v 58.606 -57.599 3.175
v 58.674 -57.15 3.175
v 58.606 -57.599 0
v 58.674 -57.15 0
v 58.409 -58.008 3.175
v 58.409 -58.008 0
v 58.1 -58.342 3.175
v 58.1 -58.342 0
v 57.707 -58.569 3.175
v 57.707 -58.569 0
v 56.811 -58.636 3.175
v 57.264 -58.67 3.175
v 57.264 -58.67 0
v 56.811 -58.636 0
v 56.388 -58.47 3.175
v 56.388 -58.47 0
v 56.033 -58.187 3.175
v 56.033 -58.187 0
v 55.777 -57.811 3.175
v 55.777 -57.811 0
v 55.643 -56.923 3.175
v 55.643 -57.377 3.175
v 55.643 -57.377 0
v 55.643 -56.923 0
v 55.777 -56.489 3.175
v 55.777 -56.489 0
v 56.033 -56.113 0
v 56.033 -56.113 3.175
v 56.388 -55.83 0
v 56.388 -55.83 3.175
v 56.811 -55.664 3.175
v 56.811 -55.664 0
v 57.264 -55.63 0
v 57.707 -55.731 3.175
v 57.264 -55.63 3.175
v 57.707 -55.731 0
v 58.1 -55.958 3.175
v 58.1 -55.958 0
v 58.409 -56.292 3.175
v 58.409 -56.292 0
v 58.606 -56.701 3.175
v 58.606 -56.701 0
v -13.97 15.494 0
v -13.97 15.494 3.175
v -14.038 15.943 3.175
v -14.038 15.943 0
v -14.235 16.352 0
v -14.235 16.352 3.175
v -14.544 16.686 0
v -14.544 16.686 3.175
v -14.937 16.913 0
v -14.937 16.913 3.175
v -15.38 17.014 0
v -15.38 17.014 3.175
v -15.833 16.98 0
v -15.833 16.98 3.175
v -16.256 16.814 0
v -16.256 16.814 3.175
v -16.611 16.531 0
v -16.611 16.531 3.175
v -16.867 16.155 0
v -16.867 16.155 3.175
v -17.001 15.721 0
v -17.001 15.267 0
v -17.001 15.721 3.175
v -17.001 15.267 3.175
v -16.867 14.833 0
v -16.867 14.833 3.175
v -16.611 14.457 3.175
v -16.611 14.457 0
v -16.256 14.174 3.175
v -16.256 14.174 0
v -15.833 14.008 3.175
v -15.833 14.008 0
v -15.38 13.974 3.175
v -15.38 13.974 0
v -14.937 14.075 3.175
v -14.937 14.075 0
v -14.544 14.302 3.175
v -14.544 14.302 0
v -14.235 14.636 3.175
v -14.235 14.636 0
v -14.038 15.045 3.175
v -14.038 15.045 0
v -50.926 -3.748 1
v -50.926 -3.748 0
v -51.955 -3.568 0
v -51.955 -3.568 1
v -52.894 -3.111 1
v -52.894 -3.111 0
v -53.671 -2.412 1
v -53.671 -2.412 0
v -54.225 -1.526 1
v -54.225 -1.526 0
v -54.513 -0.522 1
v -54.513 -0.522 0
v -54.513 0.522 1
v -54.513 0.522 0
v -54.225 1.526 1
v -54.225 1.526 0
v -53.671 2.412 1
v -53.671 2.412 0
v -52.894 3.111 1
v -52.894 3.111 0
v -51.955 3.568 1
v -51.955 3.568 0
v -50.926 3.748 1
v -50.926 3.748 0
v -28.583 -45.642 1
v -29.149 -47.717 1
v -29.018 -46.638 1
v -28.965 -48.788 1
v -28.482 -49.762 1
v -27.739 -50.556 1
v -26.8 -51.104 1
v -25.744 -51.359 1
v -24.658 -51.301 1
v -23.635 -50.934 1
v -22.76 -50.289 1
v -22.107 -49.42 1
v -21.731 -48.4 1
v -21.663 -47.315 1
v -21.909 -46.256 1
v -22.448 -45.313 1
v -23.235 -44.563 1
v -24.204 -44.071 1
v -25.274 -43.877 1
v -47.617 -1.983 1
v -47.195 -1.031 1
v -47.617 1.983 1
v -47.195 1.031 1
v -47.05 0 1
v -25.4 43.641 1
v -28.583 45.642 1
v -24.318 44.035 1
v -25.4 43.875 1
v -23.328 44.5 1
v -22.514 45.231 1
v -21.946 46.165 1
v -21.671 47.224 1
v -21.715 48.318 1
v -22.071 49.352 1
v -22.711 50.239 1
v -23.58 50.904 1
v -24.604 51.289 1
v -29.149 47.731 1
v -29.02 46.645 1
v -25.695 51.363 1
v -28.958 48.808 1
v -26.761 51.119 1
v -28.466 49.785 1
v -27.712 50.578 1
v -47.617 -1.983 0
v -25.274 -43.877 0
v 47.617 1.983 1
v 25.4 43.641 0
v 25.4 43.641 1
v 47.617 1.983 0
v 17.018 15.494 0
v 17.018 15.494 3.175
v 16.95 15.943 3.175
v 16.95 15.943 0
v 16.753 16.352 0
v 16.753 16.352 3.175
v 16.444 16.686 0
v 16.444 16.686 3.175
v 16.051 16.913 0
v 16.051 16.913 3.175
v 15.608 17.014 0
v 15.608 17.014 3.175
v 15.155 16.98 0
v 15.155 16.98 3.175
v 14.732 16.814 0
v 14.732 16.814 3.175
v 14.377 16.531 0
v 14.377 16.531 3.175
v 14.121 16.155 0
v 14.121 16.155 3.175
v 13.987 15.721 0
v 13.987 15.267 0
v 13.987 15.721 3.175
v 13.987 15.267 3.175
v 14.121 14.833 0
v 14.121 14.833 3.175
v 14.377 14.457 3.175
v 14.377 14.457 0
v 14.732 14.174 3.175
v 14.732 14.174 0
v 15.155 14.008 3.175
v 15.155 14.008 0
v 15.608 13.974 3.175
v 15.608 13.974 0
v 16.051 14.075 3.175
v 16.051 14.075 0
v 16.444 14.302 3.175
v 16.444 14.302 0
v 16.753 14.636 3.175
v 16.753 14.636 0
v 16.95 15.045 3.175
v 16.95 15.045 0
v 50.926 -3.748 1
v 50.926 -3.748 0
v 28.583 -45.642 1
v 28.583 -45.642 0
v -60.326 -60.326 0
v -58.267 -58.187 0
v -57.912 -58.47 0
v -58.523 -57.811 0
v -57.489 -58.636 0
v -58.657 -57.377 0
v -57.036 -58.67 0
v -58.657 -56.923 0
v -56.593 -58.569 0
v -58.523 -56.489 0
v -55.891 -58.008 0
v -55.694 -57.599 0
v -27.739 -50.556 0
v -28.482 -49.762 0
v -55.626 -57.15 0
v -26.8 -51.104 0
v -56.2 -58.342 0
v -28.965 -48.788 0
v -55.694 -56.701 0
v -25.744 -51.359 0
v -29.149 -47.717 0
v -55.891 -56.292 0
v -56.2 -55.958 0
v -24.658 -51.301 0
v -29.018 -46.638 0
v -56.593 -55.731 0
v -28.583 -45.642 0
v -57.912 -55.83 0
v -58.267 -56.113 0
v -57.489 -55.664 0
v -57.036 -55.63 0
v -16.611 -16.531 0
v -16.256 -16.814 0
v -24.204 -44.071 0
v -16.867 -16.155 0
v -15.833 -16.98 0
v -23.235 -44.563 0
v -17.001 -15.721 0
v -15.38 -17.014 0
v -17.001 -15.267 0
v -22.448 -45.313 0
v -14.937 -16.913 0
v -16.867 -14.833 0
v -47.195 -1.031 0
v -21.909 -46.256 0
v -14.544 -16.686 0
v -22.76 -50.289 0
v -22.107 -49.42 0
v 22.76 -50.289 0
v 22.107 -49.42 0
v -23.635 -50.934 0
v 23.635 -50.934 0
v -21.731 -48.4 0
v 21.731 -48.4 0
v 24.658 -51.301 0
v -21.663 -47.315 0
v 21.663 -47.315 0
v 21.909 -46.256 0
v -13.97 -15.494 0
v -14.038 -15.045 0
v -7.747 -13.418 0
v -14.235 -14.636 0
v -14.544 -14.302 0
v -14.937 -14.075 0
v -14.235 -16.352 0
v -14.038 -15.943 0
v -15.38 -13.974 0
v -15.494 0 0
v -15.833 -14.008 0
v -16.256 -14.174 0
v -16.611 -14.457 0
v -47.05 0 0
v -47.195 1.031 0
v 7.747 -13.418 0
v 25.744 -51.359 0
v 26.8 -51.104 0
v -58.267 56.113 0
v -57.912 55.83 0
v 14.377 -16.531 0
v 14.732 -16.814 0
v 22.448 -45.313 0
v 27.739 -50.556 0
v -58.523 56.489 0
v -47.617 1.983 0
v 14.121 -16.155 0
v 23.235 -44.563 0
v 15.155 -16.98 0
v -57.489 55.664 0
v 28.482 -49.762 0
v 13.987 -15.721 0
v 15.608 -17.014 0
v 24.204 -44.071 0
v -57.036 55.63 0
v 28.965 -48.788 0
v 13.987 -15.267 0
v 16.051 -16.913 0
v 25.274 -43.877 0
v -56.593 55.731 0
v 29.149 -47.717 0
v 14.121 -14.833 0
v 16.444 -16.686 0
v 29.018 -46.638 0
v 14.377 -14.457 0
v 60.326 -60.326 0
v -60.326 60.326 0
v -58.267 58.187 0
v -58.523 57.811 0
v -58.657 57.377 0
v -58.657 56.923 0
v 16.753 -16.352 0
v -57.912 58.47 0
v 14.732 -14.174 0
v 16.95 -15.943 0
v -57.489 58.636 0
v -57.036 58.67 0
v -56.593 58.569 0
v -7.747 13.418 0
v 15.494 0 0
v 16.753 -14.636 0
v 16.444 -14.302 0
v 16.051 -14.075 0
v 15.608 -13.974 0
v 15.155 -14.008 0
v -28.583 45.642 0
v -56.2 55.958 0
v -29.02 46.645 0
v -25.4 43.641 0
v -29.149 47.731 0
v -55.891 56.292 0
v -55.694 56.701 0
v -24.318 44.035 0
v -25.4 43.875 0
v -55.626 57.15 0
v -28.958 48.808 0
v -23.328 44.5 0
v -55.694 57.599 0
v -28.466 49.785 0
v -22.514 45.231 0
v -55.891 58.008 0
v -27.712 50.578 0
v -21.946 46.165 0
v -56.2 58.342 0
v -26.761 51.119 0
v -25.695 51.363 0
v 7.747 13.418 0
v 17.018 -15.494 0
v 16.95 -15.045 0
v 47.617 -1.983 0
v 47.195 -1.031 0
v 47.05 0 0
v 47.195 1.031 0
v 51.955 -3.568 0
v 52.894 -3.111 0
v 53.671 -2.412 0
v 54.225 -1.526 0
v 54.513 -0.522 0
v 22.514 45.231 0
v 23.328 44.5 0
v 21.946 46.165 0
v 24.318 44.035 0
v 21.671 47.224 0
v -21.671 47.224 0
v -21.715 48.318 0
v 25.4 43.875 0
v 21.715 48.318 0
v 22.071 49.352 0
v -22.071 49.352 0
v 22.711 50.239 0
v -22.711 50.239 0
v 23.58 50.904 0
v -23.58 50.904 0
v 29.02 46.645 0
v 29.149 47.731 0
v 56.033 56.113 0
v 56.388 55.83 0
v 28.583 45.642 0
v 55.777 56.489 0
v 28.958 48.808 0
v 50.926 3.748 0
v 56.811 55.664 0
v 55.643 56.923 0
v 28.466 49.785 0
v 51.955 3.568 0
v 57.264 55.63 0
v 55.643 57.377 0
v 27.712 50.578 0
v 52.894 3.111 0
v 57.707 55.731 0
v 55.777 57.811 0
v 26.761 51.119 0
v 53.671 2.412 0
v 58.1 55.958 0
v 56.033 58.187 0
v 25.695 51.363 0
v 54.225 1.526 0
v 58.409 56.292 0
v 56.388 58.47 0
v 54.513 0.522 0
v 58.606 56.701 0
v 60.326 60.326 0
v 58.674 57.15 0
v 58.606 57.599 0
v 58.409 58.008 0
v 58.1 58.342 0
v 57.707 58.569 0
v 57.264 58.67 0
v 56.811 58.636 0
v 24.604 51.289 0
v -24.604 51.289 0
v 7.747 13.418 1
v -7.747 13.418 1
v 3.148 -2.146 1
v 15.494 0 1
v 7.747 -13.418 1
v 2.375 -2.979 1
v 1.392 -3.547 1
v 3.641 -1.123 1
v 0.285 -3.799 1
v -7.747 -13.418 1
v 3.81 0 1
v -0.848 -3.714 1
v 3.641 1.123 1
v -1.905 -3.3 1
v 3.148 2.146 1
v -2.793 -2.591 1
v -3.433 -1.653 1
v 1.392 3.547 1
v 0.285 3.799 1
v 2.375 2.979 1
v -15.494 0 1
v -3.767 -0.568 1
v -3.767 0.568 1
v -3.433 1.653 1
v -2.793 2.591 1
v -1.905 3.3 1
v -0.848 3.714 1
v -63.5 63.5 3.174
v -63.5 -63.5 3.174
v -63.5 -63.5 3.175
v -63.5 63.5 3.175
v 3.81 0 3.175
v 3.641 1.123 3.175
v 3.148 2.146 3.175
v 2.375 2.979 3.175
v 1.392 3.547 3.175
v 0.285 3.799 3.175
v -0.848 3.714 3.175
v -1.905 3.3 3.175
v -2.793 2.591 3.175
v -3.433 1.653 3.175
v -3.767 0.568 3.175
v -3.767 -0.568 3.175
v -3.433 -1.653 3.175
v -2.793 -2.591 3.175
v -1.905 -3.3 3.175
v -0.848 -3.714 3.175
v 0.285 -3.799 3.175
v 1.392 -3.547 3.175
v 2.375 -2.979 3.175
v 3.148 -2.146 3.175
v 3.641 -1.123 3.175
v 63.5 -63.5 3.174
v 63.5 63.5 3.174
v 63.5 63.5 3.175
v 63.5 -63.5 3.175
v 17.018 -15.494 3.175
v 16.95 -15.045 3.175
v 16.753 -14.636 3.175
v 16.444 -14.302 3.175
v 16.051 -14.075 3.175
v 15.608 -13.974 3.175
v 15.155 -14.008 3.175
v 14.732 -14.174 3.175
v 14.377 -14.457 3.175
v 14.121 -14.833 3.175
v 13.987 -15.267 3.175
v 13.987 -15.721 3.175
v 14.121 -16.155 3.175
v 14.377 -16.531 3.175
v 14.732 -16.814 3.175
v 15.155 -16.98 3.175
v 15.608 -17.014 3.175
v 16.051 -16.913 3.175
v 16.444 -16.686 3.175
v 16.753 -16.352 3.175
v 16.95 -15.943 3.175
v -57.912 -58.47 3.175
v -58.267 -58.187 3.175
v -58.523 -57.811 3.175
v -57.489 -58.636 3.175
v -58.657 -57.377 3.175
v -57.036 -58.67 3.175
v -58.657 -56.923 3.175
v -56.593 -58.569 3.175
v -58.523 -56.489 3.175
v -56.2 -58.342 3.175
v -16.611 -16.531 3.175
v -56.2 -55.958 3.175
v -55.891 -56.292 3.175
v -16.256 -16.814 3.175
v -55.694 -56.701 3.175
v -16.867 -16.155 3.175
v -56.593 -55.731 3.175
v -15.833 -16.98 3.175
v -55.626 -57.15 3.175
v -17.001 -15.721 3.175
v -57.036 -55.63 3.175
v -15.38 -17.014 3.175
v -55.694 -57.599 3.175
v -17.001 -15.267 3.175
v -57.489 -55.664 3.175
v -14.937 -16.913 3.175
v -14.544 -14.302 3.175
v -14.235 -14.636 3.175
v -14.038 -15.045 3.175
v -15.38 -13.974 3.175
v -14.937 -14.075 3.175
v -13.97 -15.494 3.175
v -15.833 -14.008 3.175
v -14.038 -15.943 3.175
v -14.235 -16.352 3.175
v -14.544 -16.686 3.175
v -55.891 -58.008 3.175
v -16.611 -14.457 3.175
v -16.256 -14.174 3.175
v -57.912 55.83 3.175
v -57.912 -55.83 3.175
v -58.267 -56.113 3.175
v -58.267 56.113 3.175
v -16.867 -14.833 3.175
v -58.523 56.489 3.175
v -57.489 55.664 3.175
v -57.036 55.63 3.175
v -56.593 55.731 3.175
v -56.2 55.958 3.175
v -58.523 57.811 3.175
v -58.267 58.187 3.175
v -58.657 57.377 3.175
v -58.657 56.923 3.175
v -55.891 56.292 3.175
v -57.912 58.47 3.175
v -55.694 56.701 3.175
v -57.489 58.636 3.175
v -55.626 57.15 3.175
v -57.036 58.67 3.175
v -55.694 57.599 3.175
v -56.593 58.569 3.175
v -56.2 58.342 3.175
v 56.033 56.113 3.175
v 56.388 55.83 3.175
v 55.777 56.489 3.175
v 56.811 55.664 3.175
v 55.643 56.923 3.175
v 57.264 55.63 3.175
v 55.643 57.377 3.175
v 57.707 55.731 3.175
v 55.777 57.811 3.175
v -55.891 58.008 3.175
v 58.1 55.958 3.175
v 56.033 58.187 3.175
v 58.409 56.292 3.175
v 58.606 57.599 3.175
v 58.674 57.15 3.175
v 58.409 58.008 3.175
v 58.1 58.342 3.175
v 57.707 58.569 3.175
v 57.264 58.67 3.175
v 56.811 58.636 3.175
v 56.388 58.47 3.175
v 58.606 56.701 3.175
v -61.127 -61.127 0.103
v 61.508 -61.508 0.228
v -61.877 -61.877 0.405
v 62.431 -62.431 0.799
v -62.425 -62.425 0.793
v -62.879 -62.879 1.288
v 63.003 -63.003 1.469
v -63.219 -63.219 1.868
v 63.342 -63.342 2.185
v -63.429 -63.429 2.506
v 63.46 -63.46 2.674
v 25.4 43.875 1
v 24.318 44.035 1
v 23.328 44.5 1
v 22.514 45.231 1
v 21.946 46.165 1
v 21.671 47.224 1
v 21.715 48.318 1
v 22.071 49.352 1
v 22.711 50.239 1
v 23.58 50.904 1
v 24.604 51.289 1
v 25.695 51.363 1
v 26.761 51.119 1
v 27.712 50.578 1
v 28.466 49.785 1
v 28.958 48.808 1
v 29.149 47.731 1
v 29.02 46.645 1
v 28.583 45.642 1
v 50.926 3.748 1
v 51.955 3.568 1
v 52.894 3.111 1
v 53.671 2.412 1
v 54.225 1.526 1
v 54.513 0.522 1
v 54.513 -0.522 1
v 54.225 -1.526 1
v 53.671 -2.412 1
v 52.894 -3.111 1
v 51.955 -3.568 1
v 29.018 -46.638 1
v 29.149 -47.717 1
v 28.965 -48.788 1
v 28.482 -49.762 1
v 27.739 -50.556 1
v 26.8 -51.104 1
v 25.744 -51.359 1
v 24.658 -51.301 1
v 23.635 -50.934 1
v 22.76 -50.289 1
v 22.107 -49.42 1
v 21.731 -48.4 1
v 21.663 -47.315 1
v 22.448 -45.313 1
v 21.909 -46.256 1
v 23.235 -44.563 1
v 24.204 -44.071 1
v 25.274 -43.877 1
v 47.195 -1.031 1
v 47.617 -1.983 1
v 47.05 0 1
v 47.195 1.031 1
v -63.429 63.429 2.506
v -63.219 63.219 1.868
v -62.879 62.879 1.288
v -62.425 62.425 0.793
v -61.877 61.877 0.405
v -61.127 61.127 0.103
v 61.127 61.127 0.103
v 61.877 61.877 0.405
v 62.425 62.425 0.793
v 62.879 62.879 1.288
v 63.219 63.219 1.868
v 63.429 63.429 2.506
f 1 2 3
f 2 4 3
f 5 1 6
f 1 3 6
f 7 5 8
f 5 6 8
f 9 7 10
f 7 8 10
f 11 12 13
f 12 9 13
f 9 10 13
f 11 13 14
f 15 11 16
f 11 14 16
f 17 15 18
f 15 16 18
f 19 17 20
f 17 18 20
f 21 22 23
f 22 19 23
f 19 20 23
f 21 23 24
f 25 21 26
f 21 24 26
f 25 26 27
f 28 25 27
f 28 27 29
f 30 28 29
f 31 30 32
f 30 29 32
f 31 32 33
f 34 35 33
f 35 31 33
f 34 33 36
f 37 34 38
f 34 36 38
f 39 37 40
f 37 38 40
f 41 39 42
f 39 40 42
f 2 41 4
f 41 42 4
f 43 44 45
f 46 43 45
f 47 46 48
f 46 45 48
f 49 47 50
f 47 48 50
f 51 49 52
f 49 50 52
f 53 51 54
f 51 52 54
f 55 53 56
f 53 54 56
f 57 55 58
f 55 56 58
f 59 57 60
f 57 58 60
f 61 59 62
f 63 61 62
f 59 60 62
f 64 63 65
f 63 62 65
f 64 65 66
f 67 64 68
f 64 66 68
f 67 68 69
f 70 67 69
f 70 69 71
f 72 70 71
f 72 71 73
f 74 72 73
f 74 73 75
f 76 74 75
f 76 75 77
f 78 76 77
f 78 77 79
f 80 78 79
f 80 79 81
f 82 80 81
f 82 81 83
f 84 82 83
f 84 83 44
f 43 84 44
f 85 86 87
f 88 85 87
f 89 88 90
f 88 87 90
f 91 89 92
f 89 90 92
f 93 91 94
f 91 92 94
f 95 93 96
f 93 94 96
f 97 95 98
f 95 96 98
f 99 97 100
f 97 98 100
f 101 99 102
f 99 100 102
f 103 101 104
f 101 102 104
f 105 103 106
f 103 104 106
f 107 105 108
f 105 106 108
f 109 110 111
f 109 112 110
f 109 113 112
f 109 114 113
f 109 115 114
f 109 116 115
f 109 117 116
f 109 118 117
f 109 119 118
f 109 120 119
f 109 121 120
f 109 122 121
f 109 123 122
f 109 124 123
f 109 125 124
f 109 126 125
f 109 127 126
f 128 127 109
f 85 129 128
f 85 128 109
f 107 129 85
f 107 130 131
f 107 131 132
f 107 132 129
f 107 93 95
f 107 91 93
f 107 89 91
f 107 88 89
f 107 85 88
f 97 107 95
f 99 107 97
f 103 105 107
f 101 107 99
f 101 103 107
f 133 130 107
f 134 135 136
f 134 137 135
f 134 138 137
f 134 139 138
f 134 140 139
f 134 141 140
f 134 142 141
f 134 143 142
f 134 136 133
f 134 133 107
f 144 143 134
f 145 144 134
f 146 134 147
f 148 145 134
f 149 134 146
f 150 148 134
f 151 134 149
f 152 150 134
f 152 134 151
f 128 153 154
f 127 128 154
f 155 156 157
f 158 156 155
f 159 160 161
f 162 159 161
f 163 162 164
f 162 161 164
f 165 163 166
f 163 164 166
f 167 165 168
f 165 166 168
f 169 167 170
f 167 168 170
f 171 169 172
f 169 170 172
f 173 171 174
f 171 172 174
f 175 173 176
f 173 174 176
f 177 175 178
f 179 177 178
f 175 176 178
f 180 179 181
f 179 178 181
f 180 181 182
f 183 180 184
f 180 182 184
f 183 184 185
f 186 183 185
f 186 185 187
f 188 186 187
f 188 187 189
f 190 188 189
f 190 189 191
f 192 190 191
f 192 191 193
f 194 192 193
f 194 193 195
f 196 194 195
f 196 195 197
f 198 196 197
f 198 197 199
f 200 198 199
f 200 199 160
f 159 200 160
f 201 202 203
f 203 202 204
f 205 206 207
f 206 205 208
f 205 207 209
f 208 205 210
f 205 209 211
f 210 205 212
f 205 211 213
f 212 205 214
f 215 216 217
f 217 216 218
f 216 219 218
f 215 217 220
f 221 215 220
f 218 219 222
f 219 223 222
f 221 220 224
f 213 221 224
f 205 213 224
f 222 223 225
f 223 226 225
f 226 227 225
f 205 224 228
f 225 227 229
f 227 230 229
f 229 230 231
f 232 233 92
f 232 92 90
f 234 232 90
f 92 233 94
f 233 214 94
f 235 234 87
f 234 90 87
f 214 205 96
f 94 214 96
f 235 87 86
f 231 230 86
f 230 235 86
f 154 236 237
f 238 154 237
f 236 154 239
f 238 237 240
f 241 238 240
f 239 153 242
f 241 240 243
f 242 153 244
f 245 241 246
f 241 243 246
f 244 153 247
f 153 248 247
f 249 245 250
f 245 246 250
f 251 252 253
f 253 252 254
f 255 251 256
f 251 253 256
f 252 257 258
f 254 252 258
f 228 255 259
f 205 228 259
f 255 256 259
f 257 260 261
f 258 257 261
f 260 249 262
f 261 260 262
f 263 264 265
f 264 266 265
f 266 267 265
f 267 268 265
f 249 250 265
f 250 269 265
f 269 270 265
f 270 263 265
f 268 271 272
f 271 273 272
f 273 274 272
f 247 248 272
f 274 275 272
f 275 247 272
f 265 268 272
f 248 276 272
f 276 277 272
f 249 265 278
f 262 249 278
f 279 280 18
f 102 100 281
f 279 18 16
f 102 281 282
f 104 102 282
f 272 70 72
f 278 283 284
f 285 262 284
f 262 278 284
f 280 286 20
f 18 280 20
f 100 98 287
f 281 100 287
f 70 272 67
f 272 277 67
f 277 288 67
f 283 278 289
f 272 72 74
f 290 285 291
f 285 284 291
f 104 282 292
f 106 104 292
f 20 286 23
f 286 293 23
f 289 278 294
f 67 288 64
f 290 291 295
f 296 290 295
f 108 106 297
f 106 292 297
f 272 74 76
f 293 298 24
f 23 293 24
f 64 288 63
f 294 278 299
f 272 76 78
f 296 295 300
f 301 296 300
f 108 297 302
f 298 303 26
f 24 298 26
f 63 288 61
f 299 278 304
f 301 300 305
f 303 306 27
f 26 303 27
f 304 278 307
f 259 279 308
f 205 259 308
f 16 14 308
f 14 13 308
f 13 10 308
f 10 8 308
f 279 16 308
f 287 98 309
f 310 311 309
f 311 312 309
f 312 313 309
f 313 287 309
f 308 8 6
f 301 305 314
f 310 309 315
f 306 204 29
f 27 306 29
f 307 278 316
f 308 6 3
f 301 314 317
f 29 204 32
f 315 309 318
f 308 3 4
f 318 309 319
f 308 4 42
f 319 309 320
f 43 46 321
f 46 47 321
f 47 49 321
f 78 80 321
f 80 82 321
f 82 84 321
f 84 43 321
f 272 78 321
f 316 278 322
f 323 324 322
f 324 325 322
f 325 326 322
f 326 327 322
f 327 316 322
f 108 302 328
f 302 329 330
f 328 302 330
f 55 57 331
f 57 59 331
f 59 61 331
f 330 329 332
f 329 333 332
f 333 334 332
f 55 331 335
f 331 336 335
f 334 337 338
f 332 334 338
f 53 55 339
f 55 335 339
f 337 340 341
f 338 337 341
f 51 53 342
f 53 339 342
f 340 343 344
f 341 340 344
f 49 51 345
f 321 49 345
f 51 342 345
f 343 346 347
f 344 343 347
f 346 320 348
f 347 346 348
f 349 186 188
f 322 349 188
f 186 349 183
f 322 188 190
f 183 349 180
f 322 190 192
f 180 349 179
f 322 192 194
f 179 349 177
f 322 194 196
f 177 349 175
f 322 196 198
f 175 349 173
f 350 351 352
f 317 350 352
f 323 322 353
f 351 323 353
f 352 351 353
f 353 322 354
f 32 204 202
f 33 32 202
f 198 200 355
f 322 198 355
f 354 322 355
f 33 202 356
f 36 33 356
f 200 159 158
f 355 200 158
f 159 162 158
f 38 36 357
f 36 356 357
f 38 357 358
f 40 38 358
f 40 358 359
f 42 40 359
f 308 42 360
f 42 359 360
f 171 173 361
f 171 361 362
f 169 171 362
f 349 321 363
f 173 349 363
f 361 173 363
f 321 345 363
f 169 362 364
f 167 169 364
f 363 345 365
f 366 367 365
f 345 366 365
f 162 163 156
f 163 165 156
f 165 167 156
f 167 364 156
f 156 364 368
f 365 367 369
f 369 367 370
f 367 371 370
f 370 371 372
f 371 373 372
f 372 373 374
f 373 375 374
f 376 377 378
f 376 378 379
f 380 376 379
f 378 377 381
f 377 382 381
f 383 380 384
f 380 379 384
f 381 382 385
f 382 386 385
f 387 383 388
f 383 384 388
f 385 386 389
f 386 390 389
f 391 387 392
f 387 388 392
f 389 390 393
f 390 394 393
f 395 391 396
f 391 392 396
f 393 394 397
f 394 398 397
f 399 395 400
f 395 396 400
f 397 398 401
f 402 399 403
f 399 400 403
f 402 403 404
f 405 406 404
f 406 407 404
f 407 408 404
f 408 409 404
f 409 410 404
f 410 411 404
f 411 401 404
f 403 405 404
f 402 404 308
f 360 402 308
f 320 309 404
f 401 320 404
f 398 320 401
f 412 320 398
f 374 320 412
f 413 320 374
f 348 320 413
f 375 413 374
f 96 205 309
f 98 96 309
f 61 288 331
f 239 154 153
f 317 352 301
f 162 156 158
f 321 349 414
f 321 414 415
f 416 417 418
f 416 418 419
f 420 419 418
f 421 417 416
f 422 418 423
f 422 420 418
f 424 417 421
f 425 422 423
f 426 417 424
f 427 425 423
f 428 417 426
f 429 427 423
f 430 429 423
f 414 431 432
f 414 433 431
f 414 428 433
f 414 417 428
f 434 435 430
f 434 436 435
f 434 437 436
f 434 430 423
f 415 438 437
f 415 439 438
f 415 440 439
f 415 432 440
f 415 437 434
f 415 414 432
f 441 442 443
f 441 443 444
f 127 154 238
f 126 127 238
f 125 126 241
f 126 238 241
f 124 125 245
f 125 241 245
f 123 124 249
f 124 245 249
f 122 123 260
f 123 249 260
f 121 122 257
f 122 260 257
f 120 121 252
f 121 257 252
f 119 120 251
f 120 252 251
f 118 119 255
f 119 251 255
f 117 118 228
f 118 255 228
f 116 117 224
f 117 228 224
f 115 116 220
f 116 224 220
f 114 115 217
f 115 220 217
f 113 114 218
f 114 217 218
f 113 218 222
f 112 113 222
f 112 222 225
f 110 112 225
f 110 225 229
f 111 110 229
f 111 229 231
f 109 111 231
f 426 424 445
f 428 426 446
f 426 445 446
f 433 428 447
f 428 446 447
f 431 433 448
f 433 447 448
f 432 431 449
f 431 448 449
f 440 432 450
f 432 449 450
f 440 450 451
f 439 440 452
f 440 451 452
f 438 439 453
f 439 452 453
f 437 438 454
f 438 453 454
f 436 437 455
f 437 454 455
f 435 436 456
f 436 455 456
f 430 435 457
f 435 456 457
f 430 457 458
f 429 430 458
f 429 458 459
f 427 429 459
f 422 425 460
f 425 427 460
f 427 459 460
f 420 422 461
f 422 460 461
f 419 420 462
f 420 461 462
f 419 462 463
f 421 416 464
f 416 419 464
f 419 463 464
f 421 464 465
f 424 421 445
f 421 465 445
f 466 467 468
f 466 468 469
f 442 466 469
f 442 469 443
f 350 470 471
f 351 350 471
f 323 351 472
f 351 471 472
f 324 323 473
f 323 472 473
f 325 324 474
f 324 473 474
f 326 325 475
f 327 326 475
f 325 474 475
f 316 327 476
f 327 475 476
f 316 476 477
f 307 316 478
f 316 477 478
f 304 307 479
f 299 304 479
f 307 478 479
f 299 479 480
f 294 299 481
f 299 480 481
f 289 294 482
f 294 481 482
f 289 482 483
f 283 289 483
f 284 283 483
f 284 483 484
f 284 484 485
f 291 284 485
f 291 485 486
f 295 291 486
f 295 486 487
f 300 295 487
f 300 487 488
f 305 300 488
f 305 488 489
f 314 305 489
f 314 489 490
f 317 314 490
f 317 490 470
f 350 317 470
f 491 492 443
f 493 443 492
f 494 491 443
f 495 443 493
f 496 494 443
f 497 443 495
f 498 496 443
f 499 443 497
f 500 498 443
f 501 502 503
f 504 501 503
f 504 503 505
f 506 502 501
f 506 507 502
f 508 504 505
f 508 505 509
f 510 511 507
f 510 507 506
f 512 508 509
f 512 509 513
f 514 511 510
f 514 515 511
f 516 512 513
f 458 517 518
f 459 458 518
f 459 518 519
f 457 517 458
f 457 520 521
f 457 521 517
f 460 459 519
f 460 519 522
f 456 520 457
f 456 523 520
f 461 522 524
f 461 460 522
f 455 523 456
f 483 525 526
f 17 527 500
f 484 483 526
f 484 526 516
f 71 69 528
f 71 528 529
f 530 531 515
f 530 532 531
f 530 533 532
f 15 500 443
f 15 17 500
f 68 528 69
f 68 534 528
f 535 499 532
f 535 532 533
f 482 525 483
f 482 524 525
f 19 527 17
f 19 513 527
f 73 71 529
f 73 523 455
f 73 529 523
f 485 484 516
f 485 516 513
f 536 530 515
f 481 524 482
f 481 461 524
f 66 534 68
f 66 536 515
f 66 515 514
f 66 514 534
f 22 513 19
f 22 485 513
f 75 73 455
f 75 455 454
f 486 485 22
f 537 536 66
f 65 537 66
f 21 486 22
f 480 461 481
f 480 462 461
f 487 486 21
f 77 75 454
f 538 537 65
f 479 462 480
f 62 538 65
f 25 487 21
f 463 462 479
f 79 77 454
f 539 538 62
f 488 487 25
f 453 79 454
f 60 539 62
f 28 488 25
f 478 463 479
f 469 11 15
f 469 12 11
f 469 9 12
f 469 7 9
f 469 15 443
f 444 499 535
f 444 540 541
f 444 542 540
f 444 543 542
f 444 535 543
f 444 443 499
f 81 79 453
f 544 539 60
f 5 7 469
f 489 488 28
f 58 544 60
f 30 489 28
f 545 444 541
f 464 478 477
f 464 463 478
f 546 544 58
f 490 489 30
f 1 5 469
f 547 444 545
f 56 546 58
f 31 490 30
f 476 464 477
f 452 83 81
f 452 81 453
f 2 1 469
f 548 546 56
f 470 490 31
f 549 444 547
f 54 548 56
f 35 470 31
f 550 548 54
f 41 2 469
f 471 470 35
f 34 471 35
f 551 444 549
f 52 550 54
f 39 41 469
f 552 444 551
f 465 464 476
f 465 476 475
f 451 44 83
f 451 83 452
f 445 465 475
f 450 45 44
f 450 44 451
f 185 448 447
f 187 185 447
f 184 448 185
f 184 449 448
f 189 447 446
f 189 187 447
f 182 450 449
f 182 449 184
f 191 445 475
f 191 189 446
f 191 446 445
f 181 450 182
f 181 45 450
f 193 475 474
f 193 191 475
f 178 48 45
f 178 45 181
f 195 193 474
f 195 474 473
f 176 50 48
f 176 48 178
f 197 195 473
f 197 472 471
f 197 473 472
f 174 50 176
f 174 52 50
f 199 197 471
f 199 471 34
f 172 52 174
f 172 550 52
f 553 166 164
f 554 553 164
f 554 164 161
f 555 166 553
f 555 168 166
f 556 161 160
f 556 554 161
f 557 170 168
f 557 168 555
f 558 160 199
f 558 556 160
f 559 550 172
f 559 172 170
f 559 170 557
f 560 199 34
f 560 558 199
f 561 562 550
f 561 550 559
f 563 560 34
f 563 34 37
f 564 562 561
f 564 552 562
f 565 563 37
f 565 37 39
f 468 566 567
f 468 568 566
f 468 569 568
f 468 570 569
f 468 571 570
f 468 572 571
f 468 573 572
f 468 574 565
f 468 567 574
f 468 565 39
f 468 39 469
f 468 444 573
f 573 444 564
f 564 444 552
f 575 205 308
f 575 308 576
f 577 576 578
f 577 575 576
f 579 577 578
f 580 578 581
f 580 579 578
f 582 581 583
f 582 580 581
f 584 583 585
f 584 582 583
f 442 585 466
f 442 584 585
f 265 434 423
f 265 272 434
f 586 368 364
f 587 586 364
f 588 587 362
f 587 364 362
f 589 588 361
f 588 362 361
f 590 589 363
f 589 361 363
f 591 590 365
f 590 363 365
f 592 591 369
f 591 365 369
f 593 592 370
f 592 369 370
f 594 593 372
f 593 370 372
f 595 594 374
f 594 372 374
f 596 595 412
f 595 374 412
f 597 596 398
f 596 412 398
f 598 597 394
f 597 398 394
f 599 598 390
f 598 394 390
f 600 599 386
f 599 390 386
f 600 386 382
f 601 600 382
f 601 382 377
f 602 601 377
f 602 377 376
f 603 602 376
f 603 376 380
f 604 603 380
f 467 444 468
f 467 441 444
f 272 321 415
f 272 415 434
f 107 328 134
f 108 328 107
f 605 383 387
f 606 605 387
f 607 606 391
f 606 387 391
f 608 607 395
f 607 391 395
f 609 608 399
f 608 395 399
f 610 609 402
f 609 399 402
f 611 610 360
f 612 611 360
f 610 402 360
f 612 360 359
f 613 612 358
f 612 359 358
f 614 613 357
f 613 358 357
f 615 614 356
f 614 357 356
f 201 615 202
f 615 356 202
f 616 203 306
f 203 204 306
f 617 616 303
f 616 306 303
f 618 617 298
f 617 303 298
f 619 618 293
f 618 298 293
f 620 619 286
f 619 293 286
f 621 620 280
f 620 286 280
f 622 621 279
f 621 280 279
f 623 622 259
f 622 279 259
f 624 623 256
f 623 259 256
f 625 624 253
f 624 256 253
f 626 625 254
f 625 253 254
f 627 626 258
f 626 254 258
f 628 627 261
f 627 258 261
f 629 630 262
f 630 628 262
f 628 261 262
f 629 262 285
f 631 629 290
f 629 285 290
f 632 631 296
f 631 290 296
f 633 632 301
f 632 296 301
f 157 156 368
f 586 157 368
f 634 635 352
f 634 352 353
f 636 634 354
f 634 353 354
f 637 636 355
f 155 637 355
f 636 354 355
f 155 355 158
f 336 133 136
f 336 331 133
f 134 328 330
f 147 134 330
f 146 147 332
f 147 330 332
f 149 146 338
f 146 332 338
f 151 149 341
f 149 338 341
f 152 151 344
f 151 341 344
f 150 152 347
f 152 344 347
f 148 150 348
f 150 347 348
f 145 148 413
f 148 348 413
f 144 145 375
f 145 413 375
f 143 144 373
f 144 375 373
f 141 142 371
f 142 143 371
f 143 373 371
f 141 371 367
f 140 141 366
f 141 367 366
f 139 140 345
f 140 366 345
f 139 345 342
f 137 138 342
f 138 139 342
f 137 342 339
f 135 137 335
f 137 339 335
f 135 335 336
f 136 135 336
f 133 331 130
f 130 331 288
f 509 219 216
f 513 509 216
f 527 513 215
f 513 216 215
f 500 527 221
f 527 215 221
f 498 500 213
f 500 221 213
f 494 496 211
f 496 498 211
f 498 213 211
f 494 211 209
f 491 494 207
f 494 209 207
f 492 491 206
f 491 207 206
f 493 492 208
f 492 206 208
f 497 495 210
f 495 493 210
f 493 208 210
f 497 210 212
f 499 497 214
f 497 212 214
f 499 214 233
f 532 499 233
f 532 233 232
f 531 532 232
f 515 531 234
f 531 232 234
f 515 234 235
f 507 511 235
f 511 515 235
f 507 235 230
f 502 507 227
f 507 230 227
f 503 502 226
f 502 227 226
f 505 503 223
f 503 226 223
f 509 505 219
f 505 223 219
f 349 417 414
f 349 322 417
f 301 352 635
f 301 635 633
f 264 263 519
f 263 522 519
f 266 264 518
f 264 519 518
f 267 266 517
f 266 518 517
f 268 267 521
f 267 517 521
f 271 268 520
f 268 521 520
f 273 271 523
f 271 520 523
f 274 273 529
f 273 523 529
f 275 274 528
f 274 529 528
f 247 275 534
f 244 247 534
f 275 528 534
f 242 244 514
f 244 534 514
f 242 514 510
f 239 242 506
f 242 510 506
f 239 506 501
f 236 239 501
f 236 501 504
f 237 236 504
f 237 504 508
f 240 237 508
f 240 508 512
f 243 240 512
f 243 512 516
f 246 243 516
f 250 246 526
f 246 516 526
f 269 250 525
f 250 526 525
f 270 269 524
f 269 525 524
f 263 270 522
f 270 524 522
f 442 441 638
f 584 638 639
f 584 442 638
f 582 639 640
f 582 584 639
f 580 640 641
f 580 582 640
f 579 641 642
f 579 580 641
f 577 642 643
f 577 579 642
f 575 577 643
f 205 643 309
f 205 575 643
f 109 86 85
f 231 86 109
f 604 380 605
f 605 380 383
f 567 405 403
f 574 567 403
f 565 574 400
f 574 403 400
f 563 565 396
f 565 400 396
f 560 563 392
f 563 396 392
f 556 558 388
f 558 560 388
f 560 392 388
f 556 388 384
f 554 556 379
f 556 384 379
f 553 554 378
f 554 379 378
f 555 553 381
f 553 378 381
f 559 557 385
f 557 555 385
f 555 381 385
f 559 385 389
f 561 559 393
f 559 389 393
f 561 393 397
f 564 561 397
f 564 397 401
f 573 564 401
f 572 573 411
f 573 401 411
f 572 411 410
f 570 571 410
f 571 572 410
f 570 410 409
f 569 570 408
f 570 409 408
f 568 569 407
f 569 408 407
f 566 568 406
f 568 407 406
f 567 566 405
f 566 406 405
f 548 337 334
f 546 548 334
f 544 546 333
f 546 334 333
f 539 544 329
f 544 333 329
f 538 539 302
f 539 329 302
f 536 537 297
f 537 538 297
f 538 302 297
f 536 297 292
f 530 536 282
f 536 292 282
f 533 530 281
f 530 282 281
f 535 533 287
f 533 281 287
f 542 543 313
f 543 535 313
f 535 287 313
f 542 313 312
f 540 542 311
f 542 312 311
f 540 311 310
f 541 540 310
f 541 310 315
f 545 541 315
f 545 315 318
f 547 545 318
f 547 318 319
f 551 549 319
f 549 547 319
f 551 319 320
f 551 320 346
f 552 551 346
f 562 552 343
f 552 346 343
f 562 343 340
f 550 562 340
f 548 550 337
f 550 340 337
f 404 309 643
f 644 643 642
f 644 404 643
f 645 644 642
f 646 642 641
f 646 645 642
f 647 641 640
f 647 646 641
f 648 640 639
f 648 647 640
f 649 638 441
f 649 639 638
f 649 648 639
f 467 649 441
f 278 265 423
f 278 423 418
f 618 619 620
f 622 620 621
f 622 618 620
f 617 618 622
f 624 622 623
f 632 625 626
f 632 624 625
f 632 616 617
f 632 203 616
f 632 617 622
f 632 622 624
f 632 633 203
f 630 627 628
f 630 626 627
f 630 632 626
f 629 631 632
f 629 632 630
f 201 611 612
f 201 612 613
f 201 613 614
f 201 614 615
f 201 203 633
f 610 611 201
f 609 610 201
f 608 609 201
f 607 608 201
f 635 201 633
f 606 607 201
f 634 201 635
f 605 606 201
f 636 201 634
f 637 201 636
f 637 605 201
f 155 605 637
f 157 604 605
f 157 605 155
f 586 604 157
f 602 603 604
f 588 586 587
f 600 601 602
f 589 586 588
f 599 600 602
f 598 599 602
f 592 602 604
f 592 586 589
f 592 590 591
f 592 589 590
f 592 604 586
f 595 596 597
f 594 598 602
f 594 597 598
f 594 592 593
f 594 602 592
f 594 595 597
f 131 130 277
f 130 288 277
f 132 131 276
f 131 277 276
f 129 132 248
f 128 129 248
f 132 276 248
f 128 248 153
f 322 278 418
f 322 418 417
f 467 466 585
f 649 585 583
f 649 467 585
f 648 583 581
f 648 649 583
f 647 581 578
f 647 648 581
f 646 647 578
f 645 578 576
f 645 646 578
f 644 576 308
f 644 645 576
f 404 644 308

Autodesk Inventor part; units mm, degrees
ref_plane "YZ Plane" through (0, 0, 0) normal (1, 0, 0) x (0, 1, 0)
ref_plane "XZ Plane" through (0, 0, 0) normal (0, 1, 0) x (-1, 0, 0)
ref_plane "XY Plane" through (0, 0, 0) normal (0, 0, 1) x (1, 0, 0)
sketch "Sketch1" plane through (0, 0, 0) normal (0, 0, 1) x (1, 0, 0)
  line L0 (-63.5, 63.5) -> (63.5, 63.5)
  line L1 (63.5, 63.5) -> (63.5, -63.5)
  line L2 (63.5, -63.5) -> (-63.5, -63.5)
  line L3 (-63.5, -63.5) -> (-63.5, 63.5)
  circle A0 centre (-57.15, 57.15) radius 1.524
  circle A1 centre (57.15, 57.15) radius 1.524
  line L4 (63.5, 0) -> (-63.5, 0)
  circle A2 centre (-57.15, -57.15) radius 1.524
  circle A3 centre (57.15, -57.15) radius 1.524
  point P0 (0, 0)
  point P1 (0, 63.5)
  dimension "d0" = 127
  dimension "d1" = 127
  dimension "d2" = 127
  dimension "d3" = 3.048
  dimension "d4" = 3.048
  dimension "d5" = 6.35
  dimension "d6" = 6.35
  dimension "d7" = 6.35
  dimension "d8" = 6.35
extrude "Extrusion1" add sketch "Sketch1" along normal blind 3.175
sketch "Sketch2" plane through (0, 0, 3.175) normal (0, 0, 1) x (1, 0, 0)
  circle A0 centre (0, 0) radius 3.81
  circle A1 centre (-15.494, 15.494) radius 1.524
  circle A2 centre (15.494, 15.494) radius 1.524
  circle A3 centre (-15.494, -15.494) radius 1.524
  circle A4 centre (15.494, -15.494) radius 1.524
  line L0 (-15.494, 15.494) -> (15.494, 15.494)
  line L1 (-15.494, -15.494) -> (-15.494, 15.494)
  point P0 (0, 15.494)
  point P1 (-15.494, 0)
  dimension "d11" = 7.62
  dimension "d12" = 3.048
  dimension "d13" = 3.048
  dimension "d14" = 3.048
  dimension "d15" = 3.048
  dimension "d16" = 30.988
  dimension "d21" = 30.988
  dimension "d22" = 30.988
extrude "Extrusion2" cut sketch "Sketch2" against normal blind 25.4
fillet "Fillet1" radius 3.175 4 edges at (0, 63.5, 0) (-63.5, 0, 0) (0, -63.5, 0) (63.5, 0, 0)
sketch "Sketch4" plane through (0, 0, 0) normal (0, 0, -1) x (-1, 0, 0)
  circle A0 centre (0, 0) radius 3.81 projected
  line L0 (0, 0) -> (50.8, 0)
  line L1 (60.325, 60.325) -> (60.325, -60.325) projected
  line L2 (-60.325, 60.325) -> (60.325, 60.325) projected
  line L3 (0, 60.325) -> (60.325, 60.325)
  line L4 (63.5, 63.5) -> (63.5, -63.5) projected
  line L5 (60.325, 60.325) -> (60.325, 47.625)
  line L6 (25.4, 0) -> (25.4, 47.625)
  circle A1 centre (25.4, 47.625) radius 3.75
  circle A2 centre (50.8, 0) radius 3.75
  circle A3 centre (25.4, -47.625) radius 3.75
  line L7 (25.4, 47.625) -> (50.8, 0)
  line L8 (50.8, 0) -> (25.4, -47.625)
  line L9 (27.0544, 48.5074) -> (52.925, 0)
  line L10 (52.925, 0) -> (27.0544, -48.5074)
  line L11 (23.7456, 46.7426) -> (48.675, 0)
  line L12 (48.675, 0) -> (23.7456, -46.7426)
  circle A4 centre (15.494, 15.494) radius 1.524 projected
  line L13 (15.494, 0) -> (7.747, -13.4182)
  line L14 (7.747, -13.4182) -> (-7.747, -13.4182)
  line L15 (-7.747, -13.4182) -> (-15.494, 0)
  line L16 (-15.494, 0) -> (-7.747, 13.4182)
  line L17 (-7.747, 13.4182) -> (7.747, 13.4182)
  line L18 (7.747, 13.4182) -> (15.494, 0)
  line L19 (0, 60.325) -> (0, 13.4182)
  line L20 (0, 0) -> (-50.8, 0)
  line L21 (-25.4, 0) -> (-25.4, 47.625)
  circle A5 centre (-25.4, 47.625) radius 3.75
  circle A6 centre (-50.8, 0) radius 3.75
  circle A7 centre (-25.4, -47.625) radius 3.75
  line L22 (-25.4, 47.625) -> (-50.8, 0)
  line L23 (-50.8, 0) -> (-25.4, -47.625)
  line L24 (-27.0544, 48.5074) -> (-52.925, 0)
  line L25 (-52.925, 0) -> (-27.0544, -48.5074)
  line L26 (-23.7456, 46.7426) -> (-48.675, 0)
  line L27 (-48.675, 0) -> (-23.7456, -46.7426)
  circle A8 centre (-15.494, 15.494) radius 1.524
  point P0 (-25.4, 43.875)
  point P1 (-28.5827, 45.6418)
  point P2 (-50.9261, 3.7479)
  point P3 (-50.9261, -3.7479)
  point P4 (-28.5827, -45.6418)
  point P5 (-25.2739, -43.8771)
  point P6 (-47.6173, -1.9832)
  point P7 (-47.6173, 1.9832)
  point P8 (-25.4, 43.6406)
  point P9 (50.9261, 3.7479)
  point P10 (28.5827, 45.6418)
  point P11 (25.4, 43.875)
  point P12 (25.4, 43.6406)
  point P13 (47.6173, 1.9832)
  point P14 (47.6173, -1.9832)
  point P15 (25.2739, -43.8771)
  point P16 (28.5827, -45.6418)
  point P17 (50.9261, -3.7479)
  dimension "d24" = 50.8
  dimension "d25" = 12.7
  dimension "d26" = 7.5
  dimension "d27" = 7.5
  dimension "d28" = 1.875
  dimension "d29" = 1.875
extrude "Extrusion3" cut sketch "Sketch4" against normal blind 1 contours L0 L13 L14 L15 L20 A0 | A0 L20 L16 L17 L18 L0 | A2 L11 L0 | L0 L12 A2 | L6 A1 L7 A2 L11 | A6 L27 L20 | L20 L26 A6 | L26 A6 L22 A5 L21 | L11 A2 L7 L0 | L0 L8 A2 L12 | A2 L8 A3 L12 | A1 L7 L6 | L6 L7 A1 | L27 A6 L23 L20 | L20 L22 A6 L26 | L27 A7 L23 A6 | A5 L22 L21 | L21 L22 A5 | L7 A2 L9 L10 L8 | L7 A1 L9 A2 | A2 L10 A3 L8 | A3 | L23 A6 L25 L24 L22 | A6 L24 A5 L22 | L23 A7 L25 A6 | A7 | A2 L10 L9 | L24 L25 A6
sketch "Sketch5" plane through (0, 0, 0) normal (0, 0, -1) x (-1, 0, 0)
  line L0 (-7.747, 13.4182) -> (7.747, 13.4182) projected
  line L1 (7.747, 13.4182) -> (-7.747, 13.4182)
  point P0 (0, 0)
properties part number "base 2"
